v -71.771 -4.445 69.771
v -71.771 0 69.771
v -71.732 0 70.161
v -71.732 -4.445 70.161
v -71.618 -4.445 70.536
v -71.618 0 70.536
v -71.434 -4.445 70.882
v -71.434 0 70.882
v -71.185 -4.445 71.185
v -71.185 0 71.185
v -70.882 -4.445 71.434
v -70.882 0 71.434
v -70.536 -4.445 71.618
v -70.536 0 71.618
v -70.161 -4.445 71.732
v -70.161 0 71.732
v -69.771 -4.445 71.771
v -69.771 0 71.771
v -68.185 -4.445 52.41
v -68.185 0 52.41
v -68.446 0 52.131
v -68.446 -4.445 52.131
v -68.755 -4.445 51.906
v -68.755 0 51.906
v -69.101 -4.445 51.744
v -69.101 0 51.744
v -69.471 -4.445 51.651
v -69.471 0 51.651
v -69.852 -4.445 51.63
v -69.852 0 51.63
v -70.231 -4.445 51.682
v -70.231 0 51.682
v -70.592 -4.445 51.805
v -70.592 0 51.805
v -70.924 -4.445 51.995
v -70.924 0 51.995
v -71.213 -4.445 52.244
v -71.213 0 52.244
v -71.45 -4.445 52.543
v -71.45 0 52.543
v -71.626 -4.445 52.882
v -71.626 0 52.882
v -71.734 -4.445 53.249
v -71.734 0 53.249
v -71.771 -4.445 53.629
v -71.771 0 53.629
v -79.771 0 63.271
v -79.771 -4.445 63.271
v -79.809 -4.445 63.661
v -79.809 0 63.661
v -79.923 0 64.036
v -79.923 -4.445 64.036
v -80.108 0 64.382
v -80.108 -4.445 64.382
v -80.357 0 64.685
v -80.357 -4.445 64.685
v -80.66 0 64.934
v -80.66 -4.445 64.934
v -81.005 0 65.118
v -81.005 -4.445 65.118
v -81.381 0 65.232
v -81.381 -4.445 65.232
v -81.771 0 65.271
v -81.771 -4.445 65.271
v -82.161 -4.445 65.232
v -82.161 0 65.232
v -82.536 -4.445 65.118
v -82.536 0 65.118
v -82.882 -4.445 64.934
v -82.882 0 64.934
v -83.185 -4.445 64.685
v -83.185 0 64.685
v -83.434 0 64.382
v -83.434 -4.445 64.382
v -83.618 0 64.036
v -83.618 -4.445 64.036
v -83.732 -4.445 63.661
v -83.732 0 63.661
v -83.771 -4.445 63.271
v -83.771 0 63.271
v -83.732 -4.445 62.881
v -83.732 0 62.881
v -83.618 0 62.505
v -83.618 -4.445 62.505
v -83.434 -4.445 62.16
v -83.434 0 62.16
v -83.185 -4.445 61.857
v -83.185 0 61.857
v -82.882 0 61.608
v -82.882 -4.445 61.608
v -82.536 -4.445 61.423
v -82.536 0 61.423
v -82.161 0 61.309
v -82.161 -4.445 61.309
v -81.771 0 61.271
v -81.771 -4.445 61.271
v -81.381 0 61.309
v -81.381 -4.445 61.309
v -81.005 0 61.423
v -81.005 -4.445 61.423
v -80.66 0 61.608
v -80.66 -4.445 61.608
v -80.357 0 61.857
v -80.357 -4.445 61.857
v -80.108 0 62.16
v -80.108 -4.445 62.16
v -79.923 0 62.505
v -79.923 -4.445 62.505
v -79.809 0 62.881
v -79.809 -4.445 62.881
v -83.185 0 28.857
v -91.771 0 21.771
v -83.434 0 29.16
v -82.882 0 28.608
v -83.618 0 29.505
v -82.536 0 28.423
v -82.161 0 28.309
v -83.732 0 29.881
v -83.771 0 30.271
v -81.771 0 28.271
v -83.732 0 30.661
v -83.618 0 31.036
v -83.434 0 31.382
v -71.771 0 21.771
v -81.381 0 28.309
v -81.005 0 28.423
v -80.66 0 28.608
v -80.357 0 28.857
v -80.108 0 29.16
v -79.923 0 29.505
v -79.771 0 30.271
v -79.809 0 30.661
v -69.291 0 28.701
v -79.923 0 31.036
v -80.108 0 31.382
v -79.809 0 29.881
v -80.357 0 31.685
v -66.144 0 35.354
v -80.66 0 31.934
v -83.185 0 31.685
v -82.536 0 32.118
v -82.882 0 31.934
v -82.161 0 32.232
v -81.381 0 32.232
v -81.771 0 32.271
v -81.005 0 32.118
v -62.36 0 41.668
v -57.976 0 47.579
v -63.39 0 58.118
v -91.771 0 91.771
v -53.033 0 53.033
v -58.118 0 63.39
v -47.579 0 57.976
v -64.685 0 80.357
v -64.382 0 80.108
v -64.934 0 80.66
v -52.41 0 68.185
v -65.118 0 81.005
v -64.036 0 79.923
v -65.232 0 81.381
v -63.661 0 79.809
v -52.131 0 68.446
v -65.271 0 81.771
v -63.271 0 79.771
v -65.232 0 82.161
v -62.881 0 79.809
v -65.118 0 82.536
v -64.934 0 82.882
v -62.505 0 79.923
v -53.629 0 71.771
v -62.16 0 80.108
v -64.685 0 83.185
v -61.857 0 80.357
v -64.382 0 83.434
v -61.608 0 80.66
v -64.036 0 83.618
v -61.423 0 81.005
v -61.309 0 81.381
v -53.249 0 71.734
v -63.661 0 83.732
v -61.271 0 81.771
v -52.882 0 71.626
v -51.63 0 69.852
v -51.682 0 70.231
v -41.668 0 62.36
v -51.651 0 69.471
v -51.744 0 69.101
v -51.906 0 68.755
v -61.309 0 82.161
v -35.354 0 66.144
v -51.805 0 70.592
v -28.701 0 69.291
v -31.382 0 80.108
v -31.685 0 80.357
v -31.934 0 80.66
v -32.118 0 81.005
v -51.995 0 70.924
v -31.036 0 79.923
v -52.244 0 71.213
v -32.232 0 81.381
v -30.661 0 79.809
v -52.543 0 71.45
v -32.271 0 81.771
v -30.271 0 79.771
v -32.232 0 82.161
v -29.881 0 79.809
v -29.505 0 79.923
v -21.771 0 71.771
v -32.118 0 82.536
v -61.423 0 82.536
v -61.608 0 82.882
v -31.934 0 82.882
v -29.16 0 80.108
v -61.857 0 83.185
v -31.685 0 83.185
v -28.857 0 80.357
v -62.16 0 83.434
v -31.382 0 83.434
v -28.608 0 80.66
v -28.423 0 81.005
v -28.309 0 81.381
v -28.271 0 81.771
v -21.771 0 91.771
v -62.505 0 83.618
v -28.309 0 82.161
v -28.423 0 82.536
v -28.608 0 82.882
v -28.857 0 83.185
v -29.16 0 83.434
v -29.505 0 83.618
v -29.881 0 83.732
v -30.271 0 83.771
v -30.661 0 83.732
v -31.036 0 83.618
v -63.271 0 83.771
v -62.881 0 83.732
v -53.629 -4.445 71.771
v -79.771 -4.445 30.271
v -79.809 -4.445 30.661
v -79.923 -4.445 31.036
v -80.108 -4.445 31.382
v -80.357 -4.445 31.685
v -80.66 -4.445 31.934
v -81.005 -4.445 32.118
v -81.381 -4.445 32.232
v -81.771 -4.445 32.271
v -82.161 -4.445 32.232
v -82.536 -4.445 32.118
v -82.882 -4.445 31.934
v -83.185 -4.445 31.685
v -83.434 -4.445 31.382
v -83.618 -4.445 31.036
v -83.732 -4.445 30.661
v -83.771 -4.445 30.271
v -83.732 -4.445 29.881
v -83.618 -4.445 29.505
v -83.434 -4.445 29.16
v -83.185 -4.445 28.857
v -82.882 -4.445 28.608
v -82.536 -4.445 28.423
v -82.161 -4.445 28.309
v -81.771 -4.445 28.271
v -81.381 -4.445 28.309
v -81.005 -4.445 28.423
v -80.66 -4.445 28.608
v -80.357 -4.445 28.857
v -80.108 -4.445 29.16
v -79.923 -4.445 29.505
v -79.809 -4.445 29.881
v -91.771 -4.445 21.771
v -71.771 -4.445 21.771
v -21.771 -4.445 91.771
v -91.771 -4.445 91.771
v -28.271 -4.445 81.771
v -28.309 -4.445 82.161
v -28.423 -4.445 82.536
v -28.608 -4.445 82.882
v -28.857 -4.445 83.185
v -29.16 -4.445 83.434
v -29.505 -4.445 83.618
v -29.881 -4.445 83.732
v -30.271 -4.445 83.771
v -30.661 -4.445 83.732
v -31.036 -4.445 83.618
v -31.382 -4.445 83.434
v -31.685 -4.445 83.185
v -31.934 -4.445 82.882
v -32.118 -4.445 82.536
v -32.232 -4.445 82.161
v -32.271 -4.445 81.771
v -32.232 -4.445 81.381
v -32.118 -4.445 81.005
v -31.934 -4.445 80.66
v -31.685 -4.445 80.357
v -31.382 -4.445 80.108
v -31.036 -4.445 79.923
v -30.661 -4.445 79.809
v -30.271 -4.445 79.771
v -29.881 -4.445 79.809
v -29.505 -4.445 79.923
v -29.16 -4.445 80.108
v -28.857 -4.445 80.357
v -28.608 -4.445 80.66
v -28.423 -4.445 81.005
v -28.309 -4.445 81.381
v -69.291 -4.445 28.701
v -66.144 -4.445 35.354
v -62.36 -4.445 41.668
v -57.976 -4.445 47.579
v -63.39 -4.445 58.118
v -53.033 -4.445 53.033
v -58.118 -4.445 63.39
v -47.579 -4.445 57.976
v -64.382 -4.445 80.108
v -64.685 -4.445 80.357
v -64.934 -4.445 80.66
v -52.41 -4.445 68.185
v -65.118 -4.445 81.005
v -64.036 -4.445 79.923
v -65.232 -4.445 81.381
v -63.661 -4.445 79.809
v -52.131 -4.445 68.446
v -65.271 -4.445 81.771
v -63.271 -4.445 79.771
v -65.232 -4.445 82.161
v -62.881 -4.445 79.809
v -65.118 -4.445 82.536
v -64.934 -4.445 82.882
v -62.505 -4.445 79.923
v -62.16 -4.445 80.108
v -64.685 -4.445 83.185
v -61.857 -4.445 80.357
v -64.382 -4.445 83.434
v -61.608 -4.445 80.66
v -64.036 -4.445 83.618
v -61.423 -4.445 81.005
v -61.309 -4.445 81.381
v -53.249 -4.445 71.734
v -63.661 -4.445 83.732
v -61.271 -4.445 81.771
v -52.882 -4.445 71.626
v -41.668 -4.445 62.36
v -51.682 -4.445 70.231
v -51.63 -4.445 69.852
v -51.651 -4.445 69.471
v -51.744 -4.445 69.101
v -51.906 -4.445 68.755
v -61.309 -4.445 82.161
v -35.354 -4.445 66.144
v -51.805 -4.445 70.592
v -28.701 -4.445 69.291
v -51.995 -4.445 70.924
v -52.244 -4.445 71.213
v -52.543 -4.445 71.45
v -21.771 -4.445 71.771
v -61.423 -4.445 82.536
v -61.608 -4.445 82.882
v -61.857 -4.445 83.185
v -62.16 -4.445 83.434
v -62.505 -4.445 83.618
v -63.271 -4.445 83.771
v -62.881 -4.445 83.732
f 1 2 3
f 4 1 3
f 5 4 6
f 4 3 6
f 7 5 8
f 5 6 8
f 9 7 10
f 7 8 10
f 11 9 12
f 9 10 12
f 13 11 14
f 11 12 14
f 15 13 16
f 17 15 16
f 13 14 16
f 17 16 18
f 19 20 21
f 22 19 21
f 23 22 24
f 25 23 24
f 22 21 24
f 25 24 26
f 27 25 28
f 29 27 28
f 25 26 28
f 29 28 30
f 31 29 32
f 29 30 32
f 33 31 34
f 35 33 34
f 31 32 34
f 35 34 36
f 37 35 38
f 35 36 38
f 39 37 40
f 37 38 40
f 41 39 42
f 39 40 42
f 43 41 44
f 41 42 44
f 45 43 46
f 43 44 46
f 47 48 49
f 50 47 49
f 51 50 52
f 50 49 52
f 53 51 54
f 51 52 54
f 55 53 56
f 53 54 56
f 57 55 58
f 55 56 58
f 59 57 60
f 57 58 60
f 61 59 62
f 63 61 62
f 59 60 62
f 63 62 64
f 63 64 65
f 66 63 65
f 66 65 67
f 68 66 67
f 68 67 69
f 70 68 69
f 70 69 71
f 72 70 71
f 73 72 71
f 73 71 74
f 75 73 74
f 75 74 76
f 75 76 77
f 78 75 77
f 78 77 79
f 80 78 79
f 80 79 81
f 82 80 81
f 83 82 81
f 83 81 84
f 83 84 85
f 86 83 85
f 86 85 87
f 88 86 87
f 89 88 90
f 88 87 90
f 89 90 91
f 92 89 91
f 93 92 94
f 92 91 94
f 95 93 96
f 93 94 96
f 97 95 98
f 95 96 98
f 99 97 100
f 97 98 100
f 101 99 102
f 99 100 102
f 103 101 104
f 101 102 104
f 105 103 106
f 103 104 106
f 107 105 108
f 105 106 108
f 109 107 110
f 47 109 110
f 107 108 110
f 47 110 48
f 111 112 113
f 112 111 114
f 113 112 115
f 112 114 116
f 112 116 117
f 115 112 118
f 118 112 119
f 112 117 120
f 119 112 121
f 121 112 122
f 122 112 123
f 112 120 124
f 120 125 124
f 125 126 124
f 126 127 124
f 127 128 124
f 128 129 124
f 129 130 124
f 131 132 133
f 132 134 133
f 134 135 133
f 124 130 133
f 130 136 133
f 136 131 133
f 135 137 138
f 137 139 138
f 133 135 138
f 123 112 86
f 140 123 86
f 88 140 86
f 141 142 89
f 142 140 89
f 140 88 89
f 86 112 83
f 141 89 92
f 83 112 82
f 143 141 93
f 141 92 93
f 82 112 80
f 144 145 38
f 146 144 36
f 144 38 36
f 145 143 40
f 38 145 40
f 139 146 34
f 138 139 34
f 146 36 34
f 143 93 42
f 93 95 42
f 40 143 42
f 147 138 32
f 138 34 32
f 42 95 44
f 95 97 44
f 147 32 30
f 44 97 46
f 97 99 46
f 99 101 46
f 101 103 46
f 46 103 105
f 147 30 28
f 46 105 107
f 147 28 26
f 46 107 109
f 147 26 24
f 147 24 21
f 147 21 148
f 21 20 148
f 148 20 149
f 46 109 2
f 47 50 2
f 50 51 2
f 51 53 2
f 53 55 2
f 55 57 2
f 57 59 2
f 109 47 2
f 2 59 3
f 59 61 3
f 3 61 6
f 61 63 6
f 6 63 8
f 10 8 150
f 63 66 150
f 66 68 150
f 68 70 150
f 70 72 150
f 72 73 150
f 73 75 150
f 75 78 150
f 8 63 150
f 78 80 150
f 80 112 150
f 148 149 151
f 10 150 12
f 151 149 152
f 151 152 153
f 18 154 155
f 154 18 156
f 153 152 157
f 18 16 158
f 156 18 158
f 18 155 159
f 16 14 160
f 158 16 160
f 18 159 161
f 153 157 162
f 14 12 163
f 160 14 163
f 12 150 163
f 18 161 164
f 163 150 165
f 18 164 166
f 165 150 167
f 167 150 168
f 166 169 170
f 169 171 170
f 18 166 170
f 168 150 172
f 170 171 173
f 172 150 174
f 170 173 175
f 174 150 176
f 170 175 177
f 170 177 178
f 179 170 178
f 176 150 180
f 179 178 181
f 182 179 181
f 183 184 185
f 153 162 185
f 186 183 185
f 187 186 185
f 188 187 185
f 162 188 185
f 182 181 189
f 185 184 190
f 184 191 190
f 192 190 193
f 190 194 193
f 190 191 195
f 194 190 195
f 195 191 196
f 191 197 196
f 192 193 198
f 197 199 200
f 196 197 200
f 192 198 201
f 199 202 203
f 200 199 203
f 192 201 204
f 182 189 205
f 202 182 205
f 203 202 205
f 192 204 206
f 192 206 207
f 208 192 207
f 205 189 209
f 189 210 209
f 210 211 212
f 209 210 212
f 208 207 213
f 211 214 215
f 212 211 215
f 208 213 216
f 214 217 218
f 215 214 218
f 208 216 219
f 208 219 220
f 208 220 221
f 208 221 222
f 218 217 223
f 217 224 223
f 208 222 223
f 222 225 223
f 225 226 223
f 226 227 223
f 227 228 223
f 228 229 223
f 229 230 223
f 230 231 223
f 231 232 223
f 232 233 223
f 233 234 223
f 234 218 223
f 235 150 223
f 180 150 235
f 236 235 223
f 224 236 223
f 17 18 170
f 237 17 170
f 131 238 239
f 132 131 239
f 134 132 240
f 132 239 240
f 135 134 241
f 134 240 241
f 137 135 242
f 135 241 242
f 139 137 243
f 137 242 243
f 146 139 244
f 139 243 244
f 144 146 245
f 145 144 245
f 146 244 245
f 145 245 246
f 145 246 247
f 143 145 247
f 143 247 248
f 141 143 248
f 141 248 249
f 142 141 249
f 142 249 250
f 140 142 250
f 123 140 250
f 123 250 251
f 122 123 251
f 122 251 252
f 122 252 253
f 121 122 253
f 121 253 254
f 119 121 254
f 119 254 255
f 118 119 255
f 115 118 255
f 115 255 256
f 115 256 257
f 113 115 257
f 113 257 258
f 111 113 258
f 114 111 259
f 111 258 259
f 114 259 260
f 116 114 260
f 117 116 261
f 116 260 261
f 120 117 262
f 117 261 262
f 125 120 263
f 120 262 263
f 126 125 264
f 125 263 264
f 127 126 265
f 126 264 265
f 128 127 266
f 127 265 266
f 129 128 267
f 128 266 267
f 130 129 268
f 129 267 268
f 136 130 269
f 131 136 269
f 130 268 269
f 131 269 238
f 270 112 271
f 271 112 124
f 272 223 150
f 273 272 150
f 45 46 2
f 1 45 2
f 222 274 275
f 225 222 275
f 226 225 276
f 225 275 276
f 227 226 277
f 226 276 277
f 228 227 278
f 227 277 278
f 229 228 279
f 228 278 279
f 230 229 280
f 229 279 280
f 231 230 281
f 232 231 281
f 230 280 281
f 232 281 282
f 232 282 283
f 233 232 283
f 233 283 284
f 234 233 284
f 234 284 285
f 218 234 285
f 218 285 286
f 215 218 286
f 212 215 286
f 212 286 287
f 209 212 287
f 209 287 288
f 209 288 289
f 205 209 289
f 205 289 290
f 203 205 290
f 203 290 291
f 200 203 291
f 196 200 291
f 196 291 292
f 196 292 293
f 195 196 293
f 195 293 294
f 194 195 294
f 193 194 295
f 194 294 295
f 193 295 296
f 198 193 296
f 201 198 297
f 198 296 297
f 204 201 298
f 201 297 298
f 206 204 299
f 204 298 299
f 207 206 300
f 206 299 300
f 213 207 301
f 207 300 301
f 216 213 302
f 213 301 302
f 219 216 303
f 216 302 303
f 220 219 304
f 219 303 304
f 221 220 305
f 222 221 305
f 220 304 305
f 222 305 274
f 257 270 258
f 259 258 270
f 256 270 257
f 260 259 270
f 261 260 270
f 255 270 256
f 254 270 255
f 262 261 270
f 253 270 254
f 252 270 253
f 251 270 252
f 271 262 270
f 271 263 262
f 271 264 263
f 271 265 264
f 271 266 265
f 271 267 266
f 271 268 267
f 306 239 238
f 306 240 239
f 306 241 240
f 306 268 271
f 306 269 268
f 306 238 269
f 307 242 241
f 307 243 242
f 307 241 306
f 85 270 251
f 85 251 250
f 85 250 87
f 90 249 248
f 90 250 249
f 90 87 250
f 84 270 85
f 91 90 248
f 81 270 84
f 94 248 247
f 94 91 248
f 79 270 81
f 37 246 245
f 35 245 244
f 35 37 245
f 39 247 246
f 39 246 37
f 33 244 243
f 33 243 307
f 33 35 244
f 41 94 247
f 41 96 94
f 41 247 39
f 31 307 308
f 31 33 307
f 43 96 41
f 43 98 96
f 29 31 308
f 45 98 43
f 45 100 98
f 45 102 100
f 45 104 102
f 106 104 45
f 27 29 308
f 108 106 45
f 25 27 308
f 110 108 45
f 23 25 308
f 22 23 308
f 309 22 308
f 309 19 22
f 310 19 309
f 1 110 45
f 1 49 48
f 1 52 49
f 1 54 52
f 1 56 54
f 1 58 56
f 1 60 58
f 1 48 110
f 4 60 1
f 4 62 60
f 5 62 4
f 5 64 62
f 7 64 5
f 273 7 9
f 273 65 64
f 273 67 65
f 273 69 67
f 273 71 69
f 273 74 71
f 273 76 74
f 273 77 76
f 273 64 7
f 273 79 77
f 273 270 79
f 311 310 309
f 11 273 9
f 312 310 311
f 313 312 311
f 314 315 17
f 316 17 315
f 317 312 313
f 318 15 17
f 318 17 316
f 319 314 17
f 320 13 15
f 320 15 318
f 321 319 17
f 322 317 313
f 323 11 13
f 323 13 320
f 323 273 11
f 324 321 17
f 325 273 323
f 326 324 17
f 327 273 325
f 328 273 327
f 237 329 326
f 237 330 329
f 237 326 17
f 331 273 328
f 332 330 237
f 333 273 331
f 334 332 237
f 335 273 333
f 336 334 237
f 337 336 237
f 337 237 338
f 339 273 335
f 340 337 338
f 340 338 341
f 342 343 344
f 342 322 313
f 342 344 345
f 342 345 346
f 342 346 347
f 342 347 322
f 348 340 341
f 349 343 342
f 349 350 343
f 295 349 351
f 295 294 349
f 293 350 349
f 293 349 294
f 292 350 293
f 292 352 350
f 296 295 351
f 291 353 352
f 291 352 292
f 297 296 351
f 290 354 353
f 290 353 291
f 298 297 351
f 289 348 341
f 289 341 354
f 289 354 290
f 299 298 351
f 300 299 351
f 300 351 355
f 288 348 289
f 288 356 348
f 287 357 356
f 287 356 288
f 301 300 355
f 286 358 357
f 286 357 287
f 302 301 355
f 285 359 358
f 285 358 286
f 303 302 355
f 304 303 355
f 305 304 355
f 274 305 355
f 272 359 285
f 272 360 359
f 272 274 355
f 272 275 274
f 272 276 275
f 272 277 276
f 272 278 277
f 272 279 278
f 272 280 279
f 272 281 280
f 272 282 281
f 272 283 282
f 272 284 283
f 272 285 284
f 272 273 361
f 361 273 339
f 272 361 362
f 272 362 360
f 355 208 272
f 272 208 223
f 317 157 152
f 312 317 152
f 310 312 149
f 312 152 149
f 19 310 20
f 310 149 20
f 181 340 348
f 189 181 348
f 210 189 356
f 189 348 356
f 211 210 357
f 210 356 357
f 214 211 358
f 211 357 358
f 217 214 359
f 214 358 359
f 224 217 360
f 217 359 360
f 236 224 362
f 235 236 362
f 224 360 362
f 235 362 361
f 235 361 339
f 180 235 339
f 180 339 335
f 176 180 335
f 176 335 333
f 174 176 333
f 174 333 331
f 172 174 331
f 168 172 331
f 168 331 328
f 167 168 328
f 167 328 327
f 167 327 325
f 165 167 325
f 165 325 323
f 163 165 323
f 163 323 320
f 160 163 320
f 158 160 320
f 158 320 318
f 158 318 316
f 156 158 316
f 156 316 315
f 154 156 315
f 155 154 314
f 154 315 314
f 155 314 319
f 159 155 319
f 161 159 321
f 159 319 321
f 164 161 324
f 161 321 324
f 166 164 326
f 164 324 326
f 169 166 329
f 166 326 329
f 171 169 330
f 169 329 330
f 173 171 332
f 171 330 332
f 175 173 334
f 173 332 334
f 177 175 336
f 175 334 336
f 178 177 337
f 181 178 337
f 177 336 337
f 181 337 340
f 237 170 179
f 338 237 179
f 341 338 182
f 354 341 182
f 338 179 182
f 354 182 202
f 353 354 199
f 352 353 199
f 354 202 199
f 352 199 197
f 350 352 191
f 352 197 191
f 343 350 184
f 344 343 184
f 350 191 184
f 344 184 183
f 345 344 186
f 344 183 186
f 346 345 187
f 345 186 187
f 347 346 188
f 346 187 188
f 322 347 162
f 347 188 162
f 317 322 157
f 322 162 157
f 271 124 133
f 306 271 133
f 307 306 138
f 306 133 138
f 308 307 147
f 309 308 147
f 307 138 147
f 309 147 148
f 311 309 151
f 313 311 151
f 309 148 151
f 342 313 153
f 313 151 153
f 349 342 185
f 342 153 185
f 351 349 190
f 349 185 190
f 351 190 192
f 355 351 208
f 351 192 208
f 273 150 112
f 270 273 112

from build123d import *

# Parameters (mm, degrees)
F1_DEPTH = 4.445
F2_R     = 2
F3_DEPTH = 4.446


with BuildPart() as f1:
    # F0 (on Front) → F1 (new body)
    with BuildSketch(Plane.XZ):
        with BuildLine():
            Line((-91.770717, 21.770717), (-71.770717, 21.770717))
            ThreePointArc((-71.770717, 21.770717), (-53.033009, 53.033009), (-21.770717, 71.770717))
            Line((-21.770717, 71.770717), (-21.770717, 91.770717))
            Line((-21.770717, 91.770717), (-91.770717, 91.770717))
            Line((-91.770717, 91.770717), (-91.770717, 21.770717))
        make_face()
        with BuildLine():
            ThreePointArc((-52.409953, 68.185019), (-60.811183, 60.811183), (-68.185019, 52.409953))
            ThreePointArc((-68.185019, 52.409953), (-70.41438, 51.735195), (-71.770717, 53.628789))
            Line((-71.770717, 53.628789), (-71.770717, 69.770717))
            ThreePointArc((-71.770717, 69.770717), (-71.184931, 71.184931), (-69.770717, 71.770717))
            Line((-69.770717, 71.770717), (-53.628789, 71.770717))
            ThreePointArc((-53.628789, 71.770717), (-51.735195, 70.41438), (-52.409953, 68.185019))
        make_face(mode=Mode.SUBTRACT)
    extrude(amount=F1_DEPTH)

    # F2 (on face) → F3 (cut, through all)
    with BuildSketch(Plane.XZ.offset(4.445)):
        with Locations((-63.270717, 81.770717)):
            Circle(F2_R)
        with Locations((-30.270717, 81.770717)):
            Circle(F2_R)
        with Locations((-81.770717, 63.270717)):
            Circle(F2_R)
        with Locations((-81.770717, 30.270717)):
            Circle(F2_R)
    extrude(amount=-F3_DEPTH, mode=Mode.SUBTRACT)


solid = f1.part
